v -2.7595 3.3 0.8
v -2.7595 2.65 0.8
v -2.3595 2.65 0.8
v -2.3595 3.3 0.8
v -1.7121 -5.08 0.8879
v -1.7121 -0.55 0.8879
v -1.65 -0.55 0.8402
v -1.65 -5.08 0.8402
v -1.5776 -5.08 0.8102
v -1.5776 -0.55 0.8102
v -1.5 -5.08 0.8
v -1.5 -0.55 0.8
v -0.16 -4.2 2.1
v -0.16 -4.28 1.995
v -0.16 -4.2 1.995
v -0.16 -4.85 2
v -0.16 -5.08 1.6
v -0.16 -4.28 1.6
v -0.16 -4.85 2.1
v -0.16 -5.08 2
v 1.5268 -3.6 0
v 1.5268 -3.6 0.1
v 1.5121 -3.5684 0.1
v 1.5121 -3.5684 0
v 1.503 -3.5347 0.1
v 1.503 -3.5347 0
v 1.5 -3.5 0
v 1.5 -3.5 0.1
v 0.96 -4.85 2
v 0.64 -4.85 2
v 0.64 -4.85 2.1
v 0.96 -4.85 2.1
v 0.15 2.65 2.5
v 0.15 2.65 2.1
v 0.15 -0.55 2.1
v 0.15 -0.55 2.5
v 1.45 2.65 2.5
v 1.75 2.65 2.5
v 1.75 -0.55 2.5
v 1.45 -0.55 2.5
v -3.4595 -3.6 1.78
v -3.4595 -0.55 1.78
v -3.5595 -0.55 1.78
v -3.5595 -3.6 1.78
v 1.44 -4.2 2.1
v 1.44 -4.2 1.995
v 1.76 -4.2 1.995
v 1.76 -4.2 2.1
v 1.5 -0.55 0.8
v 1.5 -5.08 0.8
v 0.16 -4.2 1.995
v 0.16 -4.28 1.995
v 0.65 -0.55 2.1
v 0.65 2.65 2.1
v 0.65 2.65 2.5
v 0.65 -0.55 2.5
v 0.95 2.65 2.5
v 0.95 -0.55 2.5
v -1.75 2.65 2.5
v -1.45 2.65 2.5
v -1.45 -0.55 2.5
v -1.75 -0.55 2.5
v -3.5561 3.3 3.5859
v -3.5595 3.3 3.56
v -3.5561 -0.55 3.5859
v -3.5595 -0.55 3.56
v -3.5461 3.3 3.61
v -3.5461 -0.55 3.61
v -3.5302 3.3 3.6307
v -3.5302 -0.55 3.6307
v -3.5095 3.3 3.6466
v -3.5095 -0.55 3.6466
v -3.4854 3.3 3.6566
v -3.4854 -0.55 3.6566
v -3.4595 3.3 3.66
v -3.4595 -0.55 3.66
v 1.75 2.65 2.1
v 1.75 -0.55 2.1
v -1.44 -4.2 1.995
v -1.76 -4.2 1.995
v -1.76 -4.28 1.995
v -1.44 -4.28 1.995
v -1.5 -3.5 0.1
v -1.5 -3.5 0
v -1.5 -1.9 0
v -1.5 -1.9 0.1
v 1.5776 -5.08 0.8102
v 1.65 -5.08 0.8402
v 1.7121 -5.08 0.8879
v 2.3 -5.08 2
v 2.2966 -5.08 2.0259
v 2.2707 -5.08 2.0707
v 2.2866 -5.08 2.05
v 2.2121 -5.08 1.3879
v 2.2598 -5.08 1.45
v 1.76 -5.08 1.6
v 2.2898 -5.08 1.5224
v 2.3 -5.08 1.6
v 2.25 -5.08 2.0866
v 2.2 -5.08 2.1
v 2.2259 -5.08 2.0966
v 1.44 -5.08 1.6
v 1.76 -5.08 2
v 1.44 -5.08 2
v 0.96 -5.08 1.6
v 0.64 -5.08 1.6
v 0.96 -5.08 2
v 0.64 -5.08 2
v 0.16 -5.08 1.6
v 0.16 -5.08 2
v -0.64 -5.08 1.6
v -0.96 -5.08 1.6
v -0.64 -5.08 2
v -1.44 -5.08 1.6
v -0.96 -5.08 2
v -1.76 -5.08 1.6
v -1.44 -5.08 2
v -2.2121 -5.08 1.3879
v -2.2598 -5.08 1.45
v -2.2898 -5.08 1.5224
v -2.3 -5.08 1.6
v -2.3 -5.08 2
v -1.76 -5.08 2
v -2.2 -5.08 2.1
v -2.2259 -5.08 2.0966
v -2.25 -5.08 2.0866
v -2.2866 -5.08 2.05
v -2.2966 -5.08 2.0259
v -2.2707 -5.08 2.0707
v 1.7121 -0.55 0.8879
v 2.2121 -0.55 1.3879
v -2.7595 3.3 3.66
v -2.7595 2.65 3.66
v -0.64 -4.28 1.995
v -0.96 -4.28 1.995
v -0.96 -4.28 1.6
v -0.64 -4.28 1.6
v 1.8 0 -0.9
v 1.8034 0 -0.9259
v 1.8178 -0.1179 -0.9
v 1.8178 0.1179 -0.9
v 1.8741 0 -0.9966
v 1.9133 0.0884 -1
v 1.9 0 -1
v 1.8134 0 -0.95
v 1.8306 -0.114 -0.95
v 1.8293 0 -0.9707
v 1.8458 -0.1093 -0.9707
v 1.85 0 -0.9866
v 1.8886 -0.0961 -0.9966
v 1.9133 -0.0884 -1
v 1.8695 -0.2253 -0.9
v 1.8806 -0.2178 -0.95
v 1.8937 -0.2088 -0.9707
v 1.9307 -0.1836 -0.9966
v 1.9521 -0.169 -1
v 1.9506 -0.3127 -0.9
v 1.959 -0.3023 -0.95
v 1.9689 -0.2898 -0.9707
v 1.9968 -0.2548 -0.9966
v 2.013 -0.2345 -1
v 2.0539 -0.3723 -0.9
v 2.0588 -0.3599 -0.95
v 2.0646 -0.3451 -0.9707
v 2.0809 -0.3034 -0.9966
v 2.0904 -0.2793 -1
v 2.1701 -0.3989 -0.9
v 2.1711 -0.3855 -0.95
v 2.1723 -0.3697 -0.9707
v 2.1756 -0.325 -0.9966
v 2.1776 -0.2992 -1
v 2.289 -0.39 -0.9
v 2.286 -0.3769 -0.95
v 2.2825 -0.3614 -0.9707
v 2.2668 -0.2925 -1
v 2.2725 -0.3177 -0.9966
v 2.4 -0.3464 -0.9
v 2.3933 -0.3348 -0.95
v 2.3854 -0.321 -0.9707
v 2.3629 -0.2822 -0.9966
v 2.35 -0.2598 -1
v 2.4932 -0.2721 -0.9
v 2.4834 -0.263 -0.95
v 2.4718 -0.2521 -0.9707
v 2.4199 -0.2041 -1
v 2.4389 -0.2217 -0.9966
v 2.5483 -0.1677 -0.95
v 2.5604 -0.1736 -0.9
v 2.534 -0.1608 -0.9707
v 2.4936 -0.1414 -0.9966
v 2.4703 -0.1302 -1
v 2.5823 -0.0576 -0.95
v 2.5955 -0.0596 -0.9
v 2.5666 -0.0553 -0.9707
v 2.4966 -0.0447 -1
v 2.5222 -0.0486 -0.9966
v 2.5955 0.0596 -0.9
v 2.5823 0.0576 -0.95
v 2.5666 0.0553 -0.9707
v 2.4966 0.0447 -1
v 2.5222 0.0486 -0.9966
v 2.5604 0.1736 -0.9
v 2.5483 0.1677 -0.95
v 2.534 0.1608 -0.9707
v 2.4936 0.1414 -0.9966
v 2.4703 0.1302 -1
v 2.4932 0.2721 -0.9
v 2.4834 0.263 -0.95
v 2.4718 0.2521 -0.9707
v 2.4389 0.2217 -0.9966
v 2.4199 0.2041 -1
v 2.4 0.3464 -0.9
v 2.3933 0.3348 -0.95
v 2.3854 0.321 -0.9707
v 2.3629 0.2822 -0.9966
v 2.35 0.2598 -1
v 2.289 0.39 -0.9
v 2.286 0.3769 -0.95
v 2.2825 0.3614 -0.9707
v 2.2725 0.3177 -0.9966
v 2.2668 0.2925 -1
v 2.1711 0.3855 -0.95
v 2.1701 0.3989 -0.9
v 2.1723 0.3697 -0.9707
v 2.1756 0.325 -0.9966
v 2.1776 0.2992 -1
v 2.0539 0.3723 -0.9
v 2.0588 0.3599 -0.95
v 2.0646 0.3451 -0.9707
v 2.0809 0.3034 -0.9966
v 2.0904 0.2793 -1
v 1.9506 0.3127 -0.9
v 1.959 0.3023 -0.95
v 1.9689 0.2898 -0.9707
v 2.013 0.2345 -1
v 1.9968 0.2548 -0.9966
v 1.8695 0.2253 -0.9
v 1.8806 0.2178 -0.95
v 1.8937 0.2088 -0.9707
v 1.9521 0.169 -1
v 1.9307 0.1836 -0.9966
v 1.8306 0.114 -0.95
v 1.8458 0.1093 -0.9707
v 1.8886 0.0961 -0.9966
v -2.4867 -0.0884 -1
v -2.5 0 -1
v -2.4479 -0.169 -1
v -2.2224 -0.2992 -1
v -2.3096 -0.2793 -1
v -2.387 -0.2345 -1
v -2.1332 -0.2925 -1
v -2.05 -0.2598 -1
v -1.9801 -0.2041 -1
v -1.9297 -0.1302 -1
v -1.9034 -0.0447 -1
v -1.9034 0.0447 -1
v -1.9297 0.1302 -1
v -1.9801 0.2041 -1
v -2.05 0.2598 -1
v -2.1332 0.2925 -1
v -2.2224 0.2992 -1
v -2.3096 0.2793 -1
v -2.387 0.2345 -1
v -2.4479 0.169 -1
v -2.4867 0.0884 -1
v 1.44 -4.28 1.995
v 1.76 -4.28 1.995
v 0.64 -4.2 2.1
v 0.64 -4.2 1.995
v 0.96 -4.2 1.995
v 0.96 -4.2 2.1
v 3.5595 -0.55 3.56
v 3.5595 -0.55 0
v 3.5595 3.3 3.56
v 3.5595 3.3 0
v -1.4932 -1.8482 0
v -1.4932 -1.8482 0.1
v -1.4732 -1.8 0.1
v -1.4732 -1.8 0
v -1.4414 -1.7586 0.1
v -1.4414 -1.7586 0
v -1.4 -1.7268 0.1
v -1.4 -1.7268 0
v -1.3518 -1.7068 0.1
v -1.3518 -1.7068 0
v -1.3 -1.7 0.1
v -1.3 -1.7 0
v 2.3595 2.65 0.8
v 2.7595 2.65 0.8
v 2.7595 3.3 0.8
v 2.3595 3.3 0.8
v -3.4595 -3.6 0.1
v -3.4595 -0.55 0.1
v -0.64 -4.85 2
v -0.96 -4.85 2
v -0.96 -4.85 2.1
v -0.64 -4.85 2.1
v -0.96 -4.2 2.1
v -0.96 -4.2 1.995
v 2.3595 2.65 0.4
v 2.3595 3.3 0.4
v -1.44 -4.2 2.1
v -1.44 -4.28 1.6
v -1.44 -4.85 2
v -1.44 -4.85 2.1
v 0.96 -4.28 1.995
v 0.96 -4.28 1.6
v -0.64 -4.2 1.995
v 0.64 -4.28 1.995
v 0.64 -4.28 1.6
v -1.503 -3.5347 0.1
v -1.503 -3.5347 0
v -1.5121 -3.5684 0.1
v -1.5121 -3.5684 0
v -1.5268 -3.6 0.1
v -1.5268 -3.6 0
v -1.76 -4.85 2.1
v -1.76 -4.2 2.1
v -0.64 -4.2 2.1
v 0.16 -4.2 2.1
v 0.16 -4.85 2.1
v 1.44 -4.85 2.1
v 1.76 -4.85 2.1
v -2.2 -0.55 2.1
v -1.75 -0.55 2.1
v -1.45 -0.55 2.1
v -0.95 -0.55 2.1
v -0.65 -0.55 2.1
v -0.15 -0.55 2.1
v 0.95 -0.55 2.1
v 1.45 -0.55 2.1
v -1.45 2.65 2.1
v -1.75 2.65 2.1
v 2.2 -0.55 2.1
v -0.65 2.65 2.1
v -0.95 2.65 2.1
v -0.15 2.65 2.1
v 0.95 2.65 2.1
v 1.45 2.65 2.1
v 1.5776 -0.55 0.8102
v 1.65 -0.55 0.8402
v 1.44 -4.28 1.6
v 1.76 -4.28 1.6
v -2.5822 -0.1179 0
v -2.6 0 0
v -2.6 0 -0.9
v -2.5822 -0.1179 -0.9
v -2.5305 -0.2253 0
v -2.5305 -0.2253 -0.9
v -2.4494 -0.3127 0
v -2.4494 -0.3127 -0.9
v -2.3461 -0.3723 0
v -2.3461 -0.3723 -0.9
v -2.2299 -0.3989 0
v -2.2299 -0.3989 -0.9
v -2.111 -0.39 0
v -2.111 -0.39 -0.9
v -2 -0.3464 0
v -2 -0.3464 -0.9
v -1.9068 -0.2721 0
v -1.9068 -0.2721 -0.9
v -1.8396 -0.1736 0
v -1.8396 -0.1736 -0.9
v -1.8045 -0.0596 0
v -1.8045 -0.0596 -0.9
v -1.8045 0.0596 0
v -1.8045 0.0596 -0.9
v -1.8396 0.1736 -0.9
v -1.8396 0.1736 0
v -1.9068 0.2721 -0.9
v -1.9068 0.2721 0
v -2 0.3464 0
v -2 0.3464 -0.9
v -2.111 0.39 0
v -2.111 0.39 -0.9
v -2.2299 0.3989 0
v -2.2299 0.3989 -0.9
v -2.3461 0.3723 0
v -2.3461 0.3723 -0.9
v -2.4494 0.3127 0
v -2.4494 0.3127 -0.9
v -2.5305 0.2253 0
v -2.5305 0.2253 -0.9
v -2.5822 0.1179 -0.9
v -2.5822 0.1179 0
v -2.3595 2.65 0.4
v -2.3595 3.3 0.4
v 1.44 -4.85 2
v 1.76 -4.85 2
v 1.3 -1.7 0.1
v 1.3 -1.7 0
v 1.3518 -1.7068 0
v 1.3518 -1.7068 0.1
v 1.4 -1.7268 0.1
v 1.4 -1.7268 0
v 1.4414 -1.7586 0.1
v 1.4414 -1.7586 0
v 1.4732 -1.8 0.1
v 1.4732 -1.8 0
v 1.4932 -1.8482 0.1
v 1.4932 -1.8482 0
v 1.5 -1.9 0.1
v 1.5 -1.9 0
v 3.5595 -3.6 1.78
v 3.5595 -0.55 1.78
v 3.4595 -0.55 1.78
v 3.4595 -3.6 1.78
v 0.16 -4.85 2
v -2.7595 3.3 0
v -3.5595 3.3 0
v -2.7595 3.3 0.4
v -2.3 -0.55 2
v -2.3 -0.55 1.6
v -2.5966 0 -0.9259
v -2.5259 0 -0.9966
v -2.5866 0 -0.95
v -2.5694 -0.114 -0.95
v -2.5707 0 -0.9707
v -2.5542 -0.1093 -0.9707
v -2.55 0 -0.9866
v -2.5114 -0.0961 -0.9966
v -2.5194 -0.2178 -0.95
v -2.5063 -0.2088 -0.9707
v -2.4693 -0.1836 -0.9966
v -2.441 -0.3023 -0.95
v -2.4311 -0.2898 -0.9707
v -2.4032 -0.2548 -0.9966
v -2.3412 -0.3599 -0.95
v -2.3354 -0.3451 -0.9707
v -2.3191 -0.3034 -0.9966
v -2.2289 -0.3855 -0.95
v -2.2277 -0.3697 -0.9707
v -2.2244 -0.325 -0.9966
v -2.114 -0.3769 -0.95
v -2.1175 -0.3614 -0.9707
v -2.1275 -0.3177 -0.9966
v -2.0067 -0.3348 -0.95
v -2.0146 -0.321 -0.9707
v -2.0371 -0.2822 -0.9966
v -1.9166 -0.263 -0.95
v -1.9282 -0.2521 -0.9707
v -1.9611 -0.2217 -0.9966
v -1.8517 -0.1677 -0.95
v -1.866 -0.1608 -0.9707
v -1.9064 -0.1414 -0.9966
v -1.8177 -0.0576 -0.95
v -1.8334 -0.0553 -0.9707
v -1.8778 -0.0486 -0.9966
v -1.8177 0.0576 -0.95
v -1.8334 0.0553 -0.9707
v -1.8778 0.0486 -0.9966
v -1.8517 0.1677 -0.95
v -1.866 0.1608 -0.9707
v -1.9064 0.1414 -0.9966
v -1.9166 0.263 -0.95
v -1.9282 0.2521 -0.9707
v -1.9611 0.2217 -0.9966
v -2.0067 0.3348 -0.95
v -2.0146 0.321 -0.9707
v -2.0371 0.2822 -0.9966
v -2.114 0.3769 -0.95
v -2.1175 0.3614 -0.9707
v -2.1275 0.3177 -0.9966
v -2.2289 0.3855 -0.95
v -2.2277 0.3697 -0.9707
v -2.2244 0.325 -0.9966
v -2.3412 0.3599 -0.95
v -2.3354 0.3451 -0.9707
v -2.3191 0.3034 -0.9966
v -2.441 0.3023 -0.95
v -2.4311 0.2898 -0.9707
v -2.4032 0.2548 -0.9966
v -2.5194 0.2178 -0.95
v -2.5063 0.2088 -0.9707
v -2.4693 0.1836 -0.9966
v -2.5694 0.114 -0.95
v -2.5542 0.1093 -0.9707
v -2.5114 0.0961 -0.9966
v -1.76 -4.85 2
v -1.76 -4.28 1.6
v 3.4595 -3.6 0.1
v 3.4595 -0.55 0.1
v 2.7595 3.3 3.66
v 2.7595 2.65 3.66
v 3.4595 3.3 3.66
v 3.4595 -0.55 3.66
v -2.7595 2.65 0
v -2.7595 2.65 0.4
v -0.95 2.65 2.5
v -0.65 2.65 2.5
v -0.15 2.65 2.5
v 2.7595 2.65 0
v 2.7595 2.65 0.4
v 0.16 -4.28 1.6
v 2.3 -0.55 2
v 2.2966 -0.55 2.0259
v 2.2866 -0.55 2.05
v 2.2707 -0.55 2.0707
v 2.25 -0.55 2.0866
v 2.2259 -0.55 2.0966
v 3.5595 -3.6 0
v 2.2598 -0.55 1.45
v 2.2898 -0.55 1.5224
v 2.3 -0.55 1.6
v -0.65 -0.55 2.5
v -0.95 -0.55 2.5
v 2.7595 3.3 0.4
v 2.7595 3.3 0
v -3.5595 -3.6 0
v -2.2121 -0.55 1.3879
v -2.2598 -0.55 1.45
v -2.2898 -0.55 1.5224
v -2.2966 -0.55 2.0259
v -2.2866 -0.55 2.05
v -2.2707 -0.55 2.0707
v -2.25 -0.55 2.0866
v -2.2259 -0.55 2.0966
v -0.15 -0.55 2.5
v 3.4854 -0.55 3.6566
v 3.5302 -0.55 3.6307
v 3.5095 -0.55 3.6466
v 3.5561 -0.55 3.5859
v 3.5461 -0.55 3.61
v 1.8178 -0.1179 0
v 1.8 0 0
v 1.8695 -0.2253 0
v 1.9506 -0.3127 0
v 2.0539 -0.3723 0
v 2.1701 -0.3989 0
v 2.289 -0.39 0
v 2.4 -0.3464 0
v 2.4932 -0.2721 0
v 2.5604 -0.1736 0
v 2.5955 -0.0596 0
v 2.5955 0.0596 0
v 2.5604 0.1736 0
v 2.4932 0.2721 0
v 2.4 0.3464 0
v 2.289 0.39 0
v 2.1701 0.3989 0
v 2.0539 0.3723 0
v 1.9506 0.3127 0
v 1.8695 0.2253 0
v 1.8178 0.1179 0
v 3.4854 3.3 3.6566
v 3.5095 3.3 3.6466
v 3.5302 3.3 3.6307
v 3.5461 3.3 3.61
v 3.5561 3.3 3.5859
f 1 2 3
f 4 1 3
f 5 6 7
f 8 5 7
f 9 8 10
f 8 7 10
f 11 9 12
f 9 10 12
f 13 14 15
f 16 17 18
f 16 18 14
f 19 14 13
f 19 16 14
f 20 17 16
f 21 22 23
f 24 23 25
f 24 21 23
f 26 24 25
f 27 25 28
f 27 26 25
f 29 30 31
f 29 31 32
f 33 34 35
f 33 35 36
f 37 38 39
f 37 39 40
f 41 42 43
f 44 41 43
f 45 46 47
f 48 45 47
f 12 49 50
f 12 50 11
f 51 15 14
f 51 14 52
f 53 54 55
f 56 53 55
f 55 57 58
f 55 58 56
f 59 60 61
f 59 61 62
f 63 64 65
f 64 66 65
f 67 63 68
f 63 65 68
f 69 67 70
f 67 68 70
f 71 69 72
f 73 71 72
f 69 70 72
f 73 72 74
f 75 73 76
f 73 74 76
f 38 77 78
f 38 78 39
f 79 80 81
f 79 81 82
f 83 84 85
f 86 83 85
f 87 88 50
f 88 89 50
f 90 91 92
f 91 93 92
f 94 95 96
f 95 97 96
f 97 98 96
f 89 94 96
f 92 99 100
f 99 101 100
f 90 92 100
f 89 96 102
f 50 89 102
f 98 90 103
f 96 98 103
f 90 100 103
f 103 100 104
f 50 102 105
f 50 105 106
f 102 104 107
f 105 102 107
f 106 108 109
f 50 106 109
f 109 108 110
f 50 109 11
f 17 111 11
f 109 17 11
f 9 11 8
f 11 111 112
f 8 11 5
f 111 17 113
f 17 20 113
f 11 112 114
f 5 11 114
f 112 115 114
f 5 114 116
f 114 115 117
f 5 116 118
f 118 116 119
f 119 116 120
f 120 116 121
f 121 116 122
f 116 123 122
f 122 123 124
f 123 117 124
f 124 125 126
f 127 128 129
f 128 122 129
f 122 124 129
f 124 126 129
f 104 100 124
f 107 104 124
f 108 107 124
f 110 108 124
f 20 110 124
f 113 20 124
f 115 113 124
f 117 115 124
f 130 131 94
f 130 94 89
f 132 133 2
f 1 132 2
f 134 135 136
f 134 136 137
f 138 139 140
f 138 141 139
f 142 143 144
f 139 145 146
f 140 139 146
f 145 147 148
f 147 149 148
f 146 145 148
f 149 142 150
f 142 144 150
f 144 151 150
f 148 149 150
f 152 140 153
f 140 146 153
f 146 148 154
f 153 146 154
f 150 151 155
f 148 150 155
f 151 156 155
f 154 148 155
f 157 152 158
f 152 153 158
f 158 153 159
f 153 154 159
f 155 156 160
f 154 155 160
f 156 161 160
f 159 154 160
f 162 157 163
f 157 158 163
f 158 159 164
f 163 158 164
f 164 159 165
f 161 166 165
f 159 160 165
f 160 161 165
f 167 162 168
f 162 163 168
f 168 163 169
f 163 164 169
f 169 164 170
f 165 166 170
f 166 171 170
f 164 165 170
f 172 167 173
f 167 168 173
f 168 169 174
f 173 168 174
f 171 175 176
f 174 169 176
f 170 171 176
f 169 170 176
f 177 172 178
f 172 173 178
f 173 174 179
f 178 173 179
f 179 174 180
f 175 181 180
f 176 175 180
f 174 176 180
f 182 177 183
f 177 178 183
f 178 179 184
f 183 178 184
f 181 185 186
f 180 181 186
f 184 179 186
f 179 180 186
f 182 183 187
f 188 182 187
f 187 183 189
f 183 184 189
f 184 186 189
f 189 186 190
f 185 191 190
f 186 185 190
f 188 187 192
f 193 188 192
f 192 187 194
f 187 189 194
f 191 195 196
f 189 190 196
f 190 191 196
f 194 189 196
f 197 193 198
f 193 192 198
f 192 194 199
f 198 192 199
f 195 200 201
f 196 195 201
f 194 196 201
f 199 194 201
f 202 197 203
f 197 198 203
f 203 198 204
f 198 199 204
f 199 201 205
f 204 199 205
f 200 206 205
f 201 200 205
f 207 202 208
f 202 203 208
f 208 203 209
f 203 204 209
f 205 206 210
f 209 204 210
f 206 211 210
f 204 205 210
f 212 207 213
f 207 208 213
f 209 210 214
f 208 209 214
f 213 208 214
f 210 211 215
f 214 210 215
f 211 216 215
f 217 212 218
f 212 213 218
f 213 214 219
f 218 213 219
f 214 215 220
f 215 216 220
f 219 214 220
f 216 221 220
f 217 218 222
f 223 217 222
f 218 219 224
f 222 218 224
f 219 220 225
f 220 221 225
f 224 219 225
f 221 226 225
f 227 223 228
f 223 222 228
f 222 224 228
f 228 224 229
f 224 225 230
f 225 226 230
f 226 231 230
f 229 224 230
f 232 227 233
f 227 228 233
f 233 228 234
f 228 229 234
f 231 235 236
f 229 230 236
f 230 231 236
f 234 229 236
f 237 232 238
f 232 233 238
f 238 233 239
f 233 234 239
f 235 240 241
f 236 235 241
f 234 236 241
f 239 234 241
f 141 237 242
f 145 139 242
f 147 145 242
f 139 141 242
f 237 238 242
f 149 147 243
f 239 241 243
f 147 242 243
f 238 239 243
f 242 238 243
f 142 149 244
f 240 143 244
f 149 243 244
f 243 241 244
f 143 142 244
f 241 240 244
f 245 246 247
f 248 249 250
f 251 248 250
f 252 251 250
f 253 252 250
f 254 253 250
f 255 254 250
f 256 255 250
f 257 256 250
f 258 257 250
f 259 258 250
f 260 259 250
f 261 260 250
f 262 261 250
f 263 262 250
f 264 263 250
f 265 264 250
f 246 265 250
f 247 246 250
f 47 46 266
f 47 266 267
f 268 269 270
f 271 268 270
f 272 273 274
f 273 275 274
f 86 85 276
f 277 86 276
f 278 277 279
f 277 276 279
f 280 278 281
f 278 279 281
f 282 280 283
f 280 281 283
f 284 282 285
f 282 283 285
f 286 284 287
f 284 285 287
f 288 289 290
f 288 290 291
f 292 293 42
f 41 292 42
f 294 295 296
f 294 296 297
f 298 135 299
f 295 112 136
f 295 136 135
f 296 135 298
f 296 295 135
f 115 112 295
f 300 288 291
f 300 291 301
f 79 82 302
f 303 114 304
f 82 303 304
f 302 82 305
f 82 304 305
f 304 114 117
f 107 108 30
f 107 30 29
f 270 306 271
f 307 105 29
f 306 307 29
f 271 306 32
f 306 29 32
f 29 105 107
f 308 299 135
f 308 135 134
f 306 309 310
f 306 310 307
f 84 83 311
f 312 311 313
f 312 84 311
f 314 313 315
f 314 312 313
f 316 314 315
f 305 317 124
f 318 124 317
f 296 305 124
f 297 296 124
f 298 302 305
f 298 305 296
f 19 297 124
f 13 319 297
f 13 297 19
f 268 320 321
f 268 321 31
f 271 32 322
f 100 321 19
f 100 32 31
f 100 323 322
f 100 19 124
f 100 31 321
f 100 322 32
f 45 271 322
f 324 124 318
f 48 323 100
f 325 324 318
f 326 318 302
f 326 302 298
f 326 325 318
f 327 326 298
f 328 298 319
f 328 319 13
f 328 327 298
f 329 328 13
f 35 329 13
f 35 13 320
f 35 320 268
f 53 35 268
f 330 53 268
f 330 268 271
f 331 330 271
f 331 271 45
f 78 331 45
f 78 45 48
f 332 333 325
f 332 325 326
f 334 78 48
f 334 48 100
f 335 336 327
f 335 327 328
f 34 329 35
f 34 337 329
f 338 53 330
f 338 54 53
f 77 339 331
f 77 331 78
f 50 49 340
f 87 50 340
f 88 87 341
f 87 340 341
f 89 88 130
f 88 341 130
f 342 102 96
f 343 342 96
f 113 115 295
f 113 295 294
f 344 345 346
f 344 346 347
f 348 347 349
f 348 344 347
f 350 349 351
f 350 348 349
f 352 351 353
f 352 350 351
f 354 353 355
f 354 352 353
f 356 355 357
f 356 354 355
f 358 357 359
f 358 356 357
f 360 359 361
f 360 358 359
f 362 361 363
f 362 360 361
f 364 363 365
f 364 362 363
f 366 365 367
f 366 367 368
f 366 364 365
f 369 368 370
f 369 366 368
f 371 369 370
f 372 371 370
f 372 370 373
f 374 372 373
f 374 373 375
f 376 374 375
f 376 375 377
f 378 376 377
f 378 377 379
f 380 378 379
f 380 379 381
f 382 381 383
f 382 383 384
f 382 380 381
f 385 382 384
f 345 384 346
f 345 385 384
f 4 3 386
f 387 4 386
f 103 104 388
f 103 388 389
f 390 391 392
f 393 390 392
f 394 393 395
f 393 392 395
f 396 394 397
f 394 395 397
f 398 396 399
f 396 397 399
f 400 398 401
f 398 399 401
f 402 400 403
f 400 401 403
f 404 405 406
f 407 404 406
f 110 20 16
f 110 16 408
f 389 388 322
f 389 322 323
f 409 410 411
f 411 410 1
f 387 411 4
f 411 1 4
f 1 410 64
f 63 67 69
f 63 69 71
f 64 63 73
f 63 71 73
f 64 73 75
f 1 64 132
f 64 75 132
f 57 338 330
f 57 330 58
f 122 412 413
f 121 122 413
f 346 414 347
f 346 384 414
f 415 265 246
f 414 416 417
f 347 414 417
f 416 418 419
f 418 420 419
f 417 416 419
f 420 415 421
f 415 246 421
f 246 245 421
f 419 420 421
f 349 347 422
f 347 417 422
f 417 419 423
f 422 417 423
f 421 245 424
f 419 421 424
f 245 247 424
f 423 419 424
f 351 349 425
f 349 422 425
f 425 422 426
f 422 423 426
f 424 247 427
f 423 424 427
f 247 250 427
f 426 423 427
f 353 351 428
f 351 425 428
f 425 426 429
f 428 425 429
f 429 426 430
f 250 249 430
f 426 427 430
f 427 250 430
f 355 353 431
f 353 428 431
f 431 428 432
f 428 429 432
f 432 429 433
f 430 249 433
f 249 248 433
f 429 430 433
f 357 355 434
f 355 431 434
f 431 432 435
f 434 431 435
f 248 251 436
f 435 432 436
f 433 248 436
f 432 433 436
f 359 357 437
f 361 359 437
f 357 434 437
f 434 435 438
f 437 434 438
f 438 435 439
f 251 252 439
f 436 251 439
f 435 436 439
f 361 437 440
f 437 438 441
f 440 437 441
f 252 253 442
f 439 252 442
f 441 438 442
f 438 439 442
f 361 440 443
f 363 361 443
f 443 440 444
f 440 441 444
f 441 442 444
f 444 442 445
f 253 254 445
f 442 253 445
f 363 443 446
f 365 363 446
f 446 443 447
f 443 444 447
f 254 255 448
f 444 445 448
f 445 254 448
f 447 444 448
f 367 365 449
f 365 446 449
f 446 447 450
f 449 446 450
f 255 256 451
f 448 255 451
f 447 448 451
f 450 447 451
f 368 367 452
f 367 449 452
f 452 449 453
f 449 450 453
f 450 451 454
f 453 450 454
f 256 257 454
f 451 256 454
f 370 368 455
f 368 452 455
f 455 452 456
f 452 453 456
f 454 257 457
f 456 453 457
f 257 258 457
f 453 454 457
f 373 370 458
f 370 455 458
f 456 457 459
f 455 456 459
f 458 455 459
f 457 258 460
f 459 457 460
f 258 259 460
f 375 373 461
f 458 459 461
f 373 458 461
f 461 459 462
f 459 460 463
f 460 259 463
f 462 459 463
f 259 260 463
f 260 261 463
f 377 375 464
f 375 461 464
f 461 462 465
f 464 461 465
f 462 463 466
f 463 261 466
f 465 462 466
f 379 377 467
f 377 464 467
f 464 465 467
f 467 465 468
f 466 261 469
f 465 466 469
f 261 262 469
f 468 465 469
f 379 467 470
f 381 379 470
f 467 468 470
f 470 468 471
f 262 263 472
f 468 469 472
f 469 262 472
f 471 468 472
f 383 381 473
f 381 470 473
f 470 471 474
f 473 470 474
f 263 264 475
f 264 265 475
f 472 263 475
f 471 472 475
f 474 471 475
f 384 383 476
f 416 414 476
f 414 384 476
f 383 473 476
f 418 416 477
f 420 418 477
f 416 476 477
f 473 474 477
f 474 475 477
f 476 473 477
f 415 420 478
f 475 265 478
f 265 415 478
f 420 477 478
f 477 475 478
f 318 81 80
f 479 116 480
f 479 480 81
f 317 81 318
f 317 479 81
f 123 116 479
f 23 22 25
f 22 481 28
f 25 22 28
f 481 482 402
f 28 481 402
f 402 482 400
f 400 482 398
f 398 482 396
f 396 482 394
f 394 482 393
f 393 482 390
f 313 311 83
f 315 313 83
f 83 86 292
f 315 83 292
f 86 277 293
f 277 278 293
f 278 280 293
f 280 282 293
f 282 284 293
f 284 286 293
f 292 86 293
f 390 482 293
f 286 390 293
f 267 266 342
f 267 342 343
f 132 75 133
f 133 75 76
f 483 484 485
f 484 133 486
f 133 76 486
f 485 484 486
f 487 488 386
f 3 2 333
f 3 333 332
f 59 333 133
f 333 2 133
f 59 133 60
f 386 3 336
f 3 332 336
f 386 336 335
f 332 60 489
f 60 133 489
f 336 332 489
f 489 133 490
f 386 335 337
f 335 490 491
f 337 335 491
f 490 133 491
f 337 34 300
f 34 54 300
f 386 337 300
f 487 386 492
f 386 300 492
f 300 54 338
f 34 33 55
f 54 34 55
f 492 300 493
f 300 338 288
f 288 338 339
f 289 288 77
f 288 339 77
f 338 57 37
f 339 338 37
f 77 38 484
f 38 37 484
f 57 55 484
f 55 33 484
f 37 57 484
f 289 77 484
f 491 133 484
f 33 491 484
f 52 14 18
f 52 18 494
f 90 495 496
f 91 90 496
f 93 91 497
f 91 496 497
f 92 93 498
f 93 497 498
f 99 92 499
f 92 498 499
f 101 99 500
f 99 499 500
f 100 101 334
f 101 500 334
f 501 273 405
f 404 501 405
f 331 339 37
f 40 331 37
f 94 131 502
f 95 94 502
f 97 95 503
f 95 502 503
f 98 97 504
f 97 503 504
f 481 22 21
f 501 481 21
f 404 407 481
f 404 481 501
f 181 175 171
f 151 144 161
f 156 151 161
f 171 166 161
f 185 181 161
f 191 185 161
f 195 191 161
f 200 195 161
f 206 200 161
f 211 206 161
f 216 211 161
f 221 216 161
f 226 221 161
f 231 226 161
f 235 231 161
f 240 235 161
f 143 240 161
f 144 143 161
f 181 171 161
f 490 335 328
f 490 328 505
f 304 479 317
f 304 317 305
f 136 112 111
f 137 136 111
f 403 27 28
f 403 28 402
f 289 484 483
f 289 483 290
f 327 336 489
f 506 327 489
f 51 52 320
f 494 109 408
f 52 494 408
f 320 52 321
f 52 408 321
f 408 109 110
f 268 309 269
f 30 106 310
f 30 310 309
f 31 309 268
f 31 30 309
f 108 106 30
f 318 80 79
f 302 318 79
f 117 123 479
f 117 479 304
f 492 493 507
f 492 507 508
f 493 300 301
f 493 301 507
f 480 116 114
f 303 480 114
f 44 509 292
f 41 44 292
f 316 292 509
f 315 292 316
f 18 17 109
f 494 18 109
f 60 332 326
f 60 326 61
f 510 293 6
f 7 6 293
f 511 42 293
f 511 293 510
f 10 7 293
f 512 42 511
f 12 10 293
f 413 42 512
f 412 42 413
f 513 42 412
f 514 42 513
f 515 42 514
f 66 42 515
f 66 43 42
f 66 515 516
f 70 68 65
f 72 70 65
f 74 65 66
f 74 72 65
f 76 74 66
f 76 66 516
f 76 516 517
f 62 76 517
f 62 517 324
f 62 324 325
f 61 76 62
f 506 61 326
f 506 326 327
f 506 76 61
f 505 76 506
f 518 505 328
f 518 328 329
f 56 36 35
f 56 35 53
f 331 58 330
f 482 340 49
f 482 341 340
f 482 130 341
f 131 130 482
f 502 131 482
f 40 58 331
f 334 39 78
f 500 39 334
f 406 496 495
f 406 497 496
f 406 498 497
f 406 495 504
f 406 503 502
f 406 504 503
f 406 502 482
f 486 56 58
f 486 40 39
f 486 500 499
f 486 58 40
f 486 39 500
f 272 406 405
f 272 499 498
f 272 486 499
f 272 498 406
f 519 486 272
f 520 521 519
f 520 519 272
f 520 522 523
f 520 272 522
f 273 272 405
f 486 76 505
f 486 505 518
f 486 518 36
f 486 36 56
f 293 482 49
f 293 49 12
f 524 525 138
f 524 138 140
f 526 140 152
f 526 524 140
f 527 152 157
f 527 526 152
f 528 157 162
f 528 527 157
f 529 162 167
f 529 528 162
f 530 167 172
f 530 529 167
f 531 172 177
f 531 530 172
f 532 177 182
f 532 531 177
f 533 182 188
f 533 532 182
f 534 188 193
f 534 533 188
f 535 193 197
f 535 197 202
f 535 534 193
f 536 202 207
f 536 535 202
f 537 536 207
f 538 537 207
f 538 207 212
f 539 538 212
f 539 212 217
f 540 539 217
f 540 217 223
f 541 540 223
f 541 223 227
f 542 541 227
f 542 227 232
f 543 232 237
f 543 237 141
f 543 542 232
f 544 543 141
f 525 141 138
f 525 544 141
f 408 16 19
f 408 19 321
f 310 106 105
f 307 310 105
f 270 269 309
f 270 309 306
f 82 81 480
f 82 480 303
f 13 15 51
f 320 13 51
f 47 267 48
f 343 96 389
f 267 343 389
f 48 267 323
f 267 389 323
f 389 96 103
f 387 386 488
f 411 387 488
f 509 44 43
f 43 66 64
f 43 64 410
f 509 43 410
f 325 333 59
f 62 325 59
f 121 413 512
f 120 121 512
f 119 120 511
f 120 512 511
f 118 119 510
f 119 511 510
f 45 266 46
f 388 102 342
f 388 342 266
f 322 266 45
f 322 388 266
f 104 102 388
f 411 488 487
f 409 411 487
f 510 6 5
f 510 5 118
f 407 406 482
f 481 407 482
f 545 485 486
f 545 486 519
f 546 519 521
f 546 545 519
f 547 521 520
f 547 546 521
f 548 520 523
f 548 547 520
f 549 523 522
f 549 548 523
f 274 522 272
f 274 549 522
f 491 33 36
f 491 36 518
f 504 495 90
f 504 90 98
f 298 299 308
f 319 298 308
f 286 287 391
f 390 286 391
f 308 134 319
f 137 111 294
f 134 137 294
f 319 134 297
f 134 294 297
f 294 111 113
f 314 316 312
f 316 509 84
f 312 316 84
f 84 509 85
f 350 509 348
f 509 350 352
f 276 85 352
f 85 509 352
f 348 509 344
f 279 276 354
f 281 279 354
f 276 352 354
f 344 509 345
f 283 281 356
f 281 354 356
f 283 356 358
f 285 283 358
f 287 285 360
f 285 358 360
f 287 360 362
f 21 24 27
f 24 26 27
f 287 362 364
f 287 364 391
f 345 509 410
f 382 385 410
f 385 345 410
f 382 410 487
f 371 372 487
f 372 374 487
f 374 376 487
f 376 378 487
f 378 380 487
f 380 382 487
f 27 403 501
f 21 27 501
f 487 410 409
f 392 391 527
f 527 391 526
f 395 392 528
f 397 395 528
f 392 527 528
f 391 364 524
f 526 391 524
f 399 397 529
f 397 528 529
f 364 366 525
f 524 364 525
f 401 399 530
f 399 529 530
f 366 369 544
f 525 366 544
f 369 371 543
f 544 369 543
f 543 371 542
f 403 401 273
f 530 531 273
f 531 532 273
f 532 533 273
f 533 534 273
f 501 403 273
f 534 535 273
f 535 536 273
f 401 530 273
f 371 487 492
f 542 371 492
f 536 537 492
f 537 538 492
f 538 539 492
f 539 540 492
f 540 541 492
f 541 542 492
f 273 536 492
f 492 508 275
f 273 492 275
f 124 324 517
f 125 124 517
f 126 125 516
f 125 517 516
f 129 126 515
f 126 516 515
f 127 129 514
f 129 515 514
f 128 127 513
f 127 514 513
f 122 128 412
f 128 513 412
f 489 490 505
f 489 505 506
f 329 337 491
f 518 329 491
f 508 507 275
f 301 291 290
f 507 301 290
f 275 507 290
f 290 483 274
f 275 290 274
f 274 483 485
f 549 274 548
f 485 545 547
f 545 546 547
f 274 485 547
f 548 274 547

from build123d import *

# Parameters (mm, degrees)
EXTRUDE_SKETCH038_DEPTH                          = 0.65
EXTRUDE_SKETCH038_ONTO_SKETCH038_ROLL_ANGLE      = 90
EXTRUDE_SKETCH038_ONTO_SKETCH038_PLACEMENT_ANGLE = 180
EXTRUDE_SKETCH032_DEPTH                          = 0.3
EXTRUDE_SKETCH037_DEPTH                          = 3.05
EXTRUDE_SKETCH037_ONTO_SKETCH037_ROLL_ANGLE      = 90
SKETCH042_R                                      = 0.4
EXTRUDE_SKETCH042_DEPTH                          = 1
FILLET002005006_R                                = 0.1
SKETCH040_AS_DRAWN_W                             = 0.32
SKETCH040_AS_DRAWN_H                             = 0.4
EXTRUDE_SKETCH040_DEPTH                          = 0.8
EXTRUDE_SKETCH040_ONTO_SKETCH040_ROLL_ANGLE      = 90
SKETCH041_W                                      = 0.32
SKETCH041_H                                      = 0.65
EXTRUDE_SKETCH041_DEPTH                          = 0.15
EXTRUDE_SKETCH036_DEPTH                          = 4.53
EXTRUDE_SKETCH036_ONTO_SKETCH036_ROLL_ANGLE      = 90
SKETCH035_AS_DRAWN_W                             = 0.3
SKETCH035_AS_DRAWN_H                             = 0.4
EXTRUDE_SKETCH035_DEPTH                          = 3.2
EXTRUDE_SKETCH035_ONTO_SKETCH035_ROLL_ANGLE      = 90
EXTRUDE_SKETCH035_ONTO_SKETCH035_PLACEMENT_ANGLE = 180


with BuildPart() as f_4_sketch015_extrude_d:
    # Sketch038 as drawn → Extrude_Sketch038 (new)
    with BuildSketch(Plane.XY):
        with BuildLine():
            Line((-3.5595, 0), (-3.5595, 3.56))
            ThreePointArc((-3.4595, 3.66), (-3.530211, 3.630711), (-3.5595, 3.56))
            Line((-3.4595, 3.66), (-2.7595, 3.66))
            Line((-2.7595, 3.66), (-2.7595, 0.8))
            Line((-2.7595, 0.8), (-2.3595, 0.8))
            Line((-2.3595, 0.8), (-2.3595, 0.4))
            Line((-2.3595, 0.4), (-2.7595, 0.4))
            Line((-2.7595, 0.4), (-2.7595, 0))
            Line((-2.7595, 0), (-3.5595, 0))
        make_face()
        with BuildLine():
            Line((3.5595, 3.56), (3.5595, 0))
            Line((2.7595, 0), (3.5595, 0))
            Line((2.7595, 0.4), (2.7595, 0))
            Line((2.3595, 0.4), (2.7595, 0.4))
            Line((2.3595, 0.8), (2.3595, 0.4))
            Line((2.7595, 0.8), (2.3595, 0.8))
            Line((2.7595, 3.66), (2.7595, 0.8))
            Line((3.4595, 3.66), (2.7595, 3.66))
            ThreePointArc((3.5595, 3.56), (3.530211, 3.630711), (3.4595, 3.66))
        make_face()
    extrude(amount=EXTRUDE_SKETCH038_DEPTH)


with BuildPart() as f_4_sketch015_extrude_d_1:
    # Extrude_Sketch038 onto Sketch038 roll: moved
    add(f_4_sketch015_extrude_d.part.rotate(Axis((0, 0, 0), (1, 0, 0)), EXTRUDE_SKETCH038_ONTO_SKETCH038_ROLL_ANGLE))


with BuildPart() as f_4_sketch015_extrude_d_2:
    # Extrude_Sketch038 onto Sketch038 placement: moved
    add(f_4_sketch015_extrude_d_1.part.moved(Location((0, 2.75, 0))).rotate(Axis((0, 2.75, 0), (0, 0, 1)), EXTRUDE_SKETCH038_ONTO_SKETCH038_PLACEMENT_ANGLE))


with BuildPart() as clone_of_12_sketch032_extrude:
    # Sketch032 → Extrude_Sketch032 (new body)
    with BuildSketch(Plane(origin=(0, 0, 0), x_dir=(1, 0, 0), z_dir=(0, 0, -1))):
        with BuildLine():
            Line((-1.7, 3.6), (1.7, 3.6))
            ThreePointArc((1.7, 3.6), (1.558579, 3.541422), (1.5, 3.400001))
            Line((1.5, 3.400001), (1.5, 1.8))
            ThreePointArc((1.3, 1.6), (1.441421, 1.658579), (1.5, 1.8))
            Line((-1.3, 1.6), (1.3, 1.6))
            ThreePointArc((-1.5, 1.8), (-1.441421, 1.658579), (-1.3, 1.6))
            Line((-1.5, 3.400001), (-1.5, 1.8))
            ThreePointArc((-1.5, 3.400001), (-1.558579, 3.541422), (-1.7, 3.6))
        make_face()
    extrude(amount=-EXTRUDE_SKETCH032_DEPTH)


with BuildPart() as f_3_cut003_c:
    # Sketch037 as drawn → Extrude_Sketch037 (new)
    with BuildSketch(Plane.XY):
        Polygon((-3.5595, 0), (3.5595, 0), (3.55949, 1.78), (3.45949, 1.78), (3.45949, 0.1), (-3.4595, 0.1), (-3.4595, 1.78), (-3.5595, 1.78), align=None)
    extrude(amount=EXTRUDE_SKETCH037_DEPTH)


with BuildPart() as f_3_cut003_c_1:
    # Extrude_Sketch037 onto Sketch037 roll: moved
    add(f_3_cut003_c.part.rotate(Axis((0, 0, 0), (1, 0, 0)), EXTRUDE_SKETCH037_ONTO_SKETCH037_ROLL_ANGLE))


with BuildPart() as f_3_cut003_c_2:
    # Extrude_Sketch037 onto Sketch037 placement: moved
    add(f_3_cut003_c_1.part.moved(Location((0, -0.45, 0))))

    # Cut003: cut Clone of 12.Sketch032_Extrude
    add(clone_of_12_sketch032_extrude.part, mode=Mode.SUBTRACT)


with BuildPart() as f_5_fillet002005006_e:
    # Sketch042 → Extrude_Sketch042 (new body)
    with BuildSketch(Plane(origin=(0, -0.1, 0), x_dir=(-1, 0, 0), z_dir=(0, 0, 1))):
        with Locations((2.2, -0.2)):
            Circle(SKETCH042_R)
        with Locations((-2.2, -0.2)):
            Circle(SKETCH042_R)
    extrude(amount=-EXTRUDE_SKETCH042_DEPTH)

    # Fillet002005006
    fillet002005006_edges = [f_5_fillet002005006_e.edges().sort_by_distance(p)[0] for p in [
        (2.6, 0.1, -1),
        (-1.8, 0.1, -1),
    ]]
    fillet(fillet002005006_edges, radius=FILLET002005006_R)


with BuildPart() as f_2_2_2_sketch040_extrude:
    # Sketch040 as drawn → Extrude_Sketch040 (new)
    with BuildSketch(Plane.XY):
        with Locations((-1.6, 1.8)):
            Rectangle(SKETCH040_AS_DRAWN_W, SKETCH040_AS_DRAWN_H)
        with Locations((-0.8, 1.8)):
            Rectangle(SKETCH040_AS_DRAWN_W, SKETCH040_AS_DRAWN_H)
        with Locations((0, 1.8)):
            Rectangle(SKETCH040_AS_DRAWN_W, SKETCH040_AS_DRAWN_H)
        with Locations((0.8, 1.8)):
            Rectangle(SKETCH040_AS_DRAWN_W, SKETCH040_AS_DRAWN_H)
        with Locations((1.6, 1.8)):
            Rectangle(SKETCH040_AS_DRAWN_W, SKETCH040_AS_DRAWN_H)
    extrude(amount=-EXTRUDE_SKETCH040_DEPTH)


with BuildPart() as f_2_2_2_sketch040_extrude_1:
    # Extrude_Sketch040 onto Sketch040 roll: moved
    add(f_2_2_2_sketch040_extrude.part.rotate(Axis((0, 0, 0), (1, 0, 0)), EXTRUDE_SKETCH040_ONTO_SKETCH040_ROLL_ANGLE))


with BuildPart() as f_2_2_2_sketch040_extrude_2:
    # Extrude_Sketch040 onto Sketch040 placement: moved
    add(f_2_2_2_sketch040_extrude_1.part.moved(Location((0, -4.98, 0))))


with BuildPart() as f_2_2_fusion009005_b:
    # Sketch041 → Extrude_Sketch041 (new body)
    with BuildSketch(Plane(origin=(0, -0.2, 1.995), x_dir=(1, 0, 0), z_dir=(0, 0, 1))):
        with Locations((-1.6, -4.225)):
            Rectangle(SKETCH041_W, SKETCH041_H)
        with Locations((-0.8, -4.225)):
            Rectangle(SKETCH041_W, SKETCH041_H)
        with Locations((0, -4.225)):
            Rectangle(SKETCH041_W, SKETCH041_H)
        with Locations((0.8, -4.225)):
            Rectangle(SKETCH041_W, SKETCH041_H)
        with Locations((1.6, -4.225)):
            Rectangle(SKETCH041_W, SKETCH041_H)
    extrude(amount=EXTRUDE_SKETCH041_DEPTH)

    # Fusion009005: union 2.2.2.Sketch040_Extrude
    add(f_2_2_2_sketch040_extrude_2.part)


with BuildPart() as f_2_cut004002_b:
    # Sketch036 as drawn → Extrude_Sketch036 (new)
    with BuildSketch(Plane.XY):
        with BuildLine():
            Line((-2.2, 2.1), (2.2, 2.1))
            ThreePointArc((2.3, 2), (2.270711, 2.070711), (2.2, 2.1))
            Line((2.3, 2), (2.3, 1.6))
            ThreePointArc((2.212132, 1.387868), (2.277164, 1.485195), (2.3, 1.6))
            Line((2.212132, 1.387868), (1.712132, 0.887868))
            ThreePointArc((1.5, 0.8), (1.614805, 0.822836), (1.712132, 0.887868))
            Line((1.5, 0.8), (-1.5, 0.8))
            ThreePointArc((-1.712132, 0.887868), (-1.614805, 0.822836), (-1.5, 0.8))
            Line((-1.712132, 0.887868), (-2.212132, 1.387868))
            ThreePointArc((-2.3, 1.6), (-2.277164, 1.485195), (-2.212132, 1.387868))
            Line((-2.3, 2), (-2.3, 1.6))
            ThreePointArc((-2.2, 2.1), (-2.270711, 2.070711), (-2.3, 2))
        make_face()
    extrude(amount=EXTRUDE_SKETCH036_DEPTH)


with BuildPart() as f_2_cut004002_b_1:
    # Extrude_Sketch036 onto Sketch036 roll: moved
    add(f_2_cut004002_b.part.rotate(Axis((0, 0, 0), (1, 0, 0)), EXTRUDE_SKETCH036_ONTO_SKETCH036_ROLL_ANGLE))


with BuildPart() as f_2_cut004002_b_2:
    # Extrude_Sketch036 onto Sketch036 placement: moved
    add(f_2_cut004002_b_1.part.moved(Location((0, -0.45, 0))))

    # Cut004002: cut 2.2.Fusion009005-B
    add(f_2_2_fusion009005_b.part, mode=Mode.SUBTRACT)


with BuildPart() as fusion009006:
    # Sketch035 as drawn → Extrude_Sketch035 (new)
    with BuildSketch(Plane.XY):
        with BuildLine():
            Line((3.5595, 0), (-3.5595, 0))
            Line((-3.5595, 0), (-3.5595, 3.56))
            ThreePointArc((-3.4595, 3.66), (-3.530211, 3.630711), (-3.5595, 3.56))
            Line((-3.4595, 3.66), (3.4595, 3.66))
            ThreePointArc((3.5595, 3.56), (3.530211, 3.630711), (3.4595, 3.66))
            Line((3.5595, 3.56), (3.5595, 0))
        make_face()
        with Locations((-1.6, 2.3)):
            Rectangle(SKETCH035_AS_DRAWN_W, SKETCH035_AS_DRAWN_H, mode=Mode.SUBTRACT)
        with Locations((-0.8, 2.3)):
            Rectangle(SKETCH035_AS_DRAWN_W, SKETCH035_AS_DRAWN_H, mode=Mode.SUBTRACT)
        with Locations((0, 2.3)):
            Rectangle(SKETCH035_AS_DRAWN_W, SKETCH035_AS_DRAWN_H, mode=Mode.SUBTRACT)
        with Locations((0.8, 2.3)):
            Rectangle(SKETCH035_AS_DRAWN_W, SKETCH035_AS_DRAWN_H, mode=Mode.SUBTRACT)
        with Locations((1.6, 2.3)):
            Rectangle(SKETCH035_AS_DRAWN_W, SKETCH035_AS_DRAWN_H, mode=Mode.SUBTRACT)
    extrude(amount=-EXTRUDE_SKETCH035_DEPTH)


with BuildPart() as fusion009006_1:
    # Extrude_Sketch035 onto Sketch035 roll: moved
    add(fusion009006.part.rotate(Axis((0, 0, 0), (1, 0, 0)), EXTRUDE_SKETCH035_ONTO_SKETCH035_ROLL_ANGLE))


with BuildPart() as fusion009006_2:
    # Extrude_Sketch035 onto Sketch035 placement: moved
    add(fusion009006_1.part.moved(Location((0, 2.75, 0))).rotate(Axis((0, 2.75, 0), (0, 0, 1)), EXTRUDE_SKETCH035_ONTO_SKETCH035_PLACEMENT_ANGLE))

    # Fusion009006: union 4..Sketch015_Extrude-D, 3.Cut003-C, 5.Fillet002005006-E, 2.Cut004002-B
    add(f_4_sketch015_extrude_d_2.part)
    add(f_3_cut003_c_2.part)
    add(f_5_fillet002005006_e.part)
    add(f_2_cut004002_b_2.part)


with BuildPart() as fusion009006_3:
    # Fusion009006 placement: moved
    add(fusion009006_2.part.moved(Location((0, -0.1, 0))))


solid = fusion009006_3.part
